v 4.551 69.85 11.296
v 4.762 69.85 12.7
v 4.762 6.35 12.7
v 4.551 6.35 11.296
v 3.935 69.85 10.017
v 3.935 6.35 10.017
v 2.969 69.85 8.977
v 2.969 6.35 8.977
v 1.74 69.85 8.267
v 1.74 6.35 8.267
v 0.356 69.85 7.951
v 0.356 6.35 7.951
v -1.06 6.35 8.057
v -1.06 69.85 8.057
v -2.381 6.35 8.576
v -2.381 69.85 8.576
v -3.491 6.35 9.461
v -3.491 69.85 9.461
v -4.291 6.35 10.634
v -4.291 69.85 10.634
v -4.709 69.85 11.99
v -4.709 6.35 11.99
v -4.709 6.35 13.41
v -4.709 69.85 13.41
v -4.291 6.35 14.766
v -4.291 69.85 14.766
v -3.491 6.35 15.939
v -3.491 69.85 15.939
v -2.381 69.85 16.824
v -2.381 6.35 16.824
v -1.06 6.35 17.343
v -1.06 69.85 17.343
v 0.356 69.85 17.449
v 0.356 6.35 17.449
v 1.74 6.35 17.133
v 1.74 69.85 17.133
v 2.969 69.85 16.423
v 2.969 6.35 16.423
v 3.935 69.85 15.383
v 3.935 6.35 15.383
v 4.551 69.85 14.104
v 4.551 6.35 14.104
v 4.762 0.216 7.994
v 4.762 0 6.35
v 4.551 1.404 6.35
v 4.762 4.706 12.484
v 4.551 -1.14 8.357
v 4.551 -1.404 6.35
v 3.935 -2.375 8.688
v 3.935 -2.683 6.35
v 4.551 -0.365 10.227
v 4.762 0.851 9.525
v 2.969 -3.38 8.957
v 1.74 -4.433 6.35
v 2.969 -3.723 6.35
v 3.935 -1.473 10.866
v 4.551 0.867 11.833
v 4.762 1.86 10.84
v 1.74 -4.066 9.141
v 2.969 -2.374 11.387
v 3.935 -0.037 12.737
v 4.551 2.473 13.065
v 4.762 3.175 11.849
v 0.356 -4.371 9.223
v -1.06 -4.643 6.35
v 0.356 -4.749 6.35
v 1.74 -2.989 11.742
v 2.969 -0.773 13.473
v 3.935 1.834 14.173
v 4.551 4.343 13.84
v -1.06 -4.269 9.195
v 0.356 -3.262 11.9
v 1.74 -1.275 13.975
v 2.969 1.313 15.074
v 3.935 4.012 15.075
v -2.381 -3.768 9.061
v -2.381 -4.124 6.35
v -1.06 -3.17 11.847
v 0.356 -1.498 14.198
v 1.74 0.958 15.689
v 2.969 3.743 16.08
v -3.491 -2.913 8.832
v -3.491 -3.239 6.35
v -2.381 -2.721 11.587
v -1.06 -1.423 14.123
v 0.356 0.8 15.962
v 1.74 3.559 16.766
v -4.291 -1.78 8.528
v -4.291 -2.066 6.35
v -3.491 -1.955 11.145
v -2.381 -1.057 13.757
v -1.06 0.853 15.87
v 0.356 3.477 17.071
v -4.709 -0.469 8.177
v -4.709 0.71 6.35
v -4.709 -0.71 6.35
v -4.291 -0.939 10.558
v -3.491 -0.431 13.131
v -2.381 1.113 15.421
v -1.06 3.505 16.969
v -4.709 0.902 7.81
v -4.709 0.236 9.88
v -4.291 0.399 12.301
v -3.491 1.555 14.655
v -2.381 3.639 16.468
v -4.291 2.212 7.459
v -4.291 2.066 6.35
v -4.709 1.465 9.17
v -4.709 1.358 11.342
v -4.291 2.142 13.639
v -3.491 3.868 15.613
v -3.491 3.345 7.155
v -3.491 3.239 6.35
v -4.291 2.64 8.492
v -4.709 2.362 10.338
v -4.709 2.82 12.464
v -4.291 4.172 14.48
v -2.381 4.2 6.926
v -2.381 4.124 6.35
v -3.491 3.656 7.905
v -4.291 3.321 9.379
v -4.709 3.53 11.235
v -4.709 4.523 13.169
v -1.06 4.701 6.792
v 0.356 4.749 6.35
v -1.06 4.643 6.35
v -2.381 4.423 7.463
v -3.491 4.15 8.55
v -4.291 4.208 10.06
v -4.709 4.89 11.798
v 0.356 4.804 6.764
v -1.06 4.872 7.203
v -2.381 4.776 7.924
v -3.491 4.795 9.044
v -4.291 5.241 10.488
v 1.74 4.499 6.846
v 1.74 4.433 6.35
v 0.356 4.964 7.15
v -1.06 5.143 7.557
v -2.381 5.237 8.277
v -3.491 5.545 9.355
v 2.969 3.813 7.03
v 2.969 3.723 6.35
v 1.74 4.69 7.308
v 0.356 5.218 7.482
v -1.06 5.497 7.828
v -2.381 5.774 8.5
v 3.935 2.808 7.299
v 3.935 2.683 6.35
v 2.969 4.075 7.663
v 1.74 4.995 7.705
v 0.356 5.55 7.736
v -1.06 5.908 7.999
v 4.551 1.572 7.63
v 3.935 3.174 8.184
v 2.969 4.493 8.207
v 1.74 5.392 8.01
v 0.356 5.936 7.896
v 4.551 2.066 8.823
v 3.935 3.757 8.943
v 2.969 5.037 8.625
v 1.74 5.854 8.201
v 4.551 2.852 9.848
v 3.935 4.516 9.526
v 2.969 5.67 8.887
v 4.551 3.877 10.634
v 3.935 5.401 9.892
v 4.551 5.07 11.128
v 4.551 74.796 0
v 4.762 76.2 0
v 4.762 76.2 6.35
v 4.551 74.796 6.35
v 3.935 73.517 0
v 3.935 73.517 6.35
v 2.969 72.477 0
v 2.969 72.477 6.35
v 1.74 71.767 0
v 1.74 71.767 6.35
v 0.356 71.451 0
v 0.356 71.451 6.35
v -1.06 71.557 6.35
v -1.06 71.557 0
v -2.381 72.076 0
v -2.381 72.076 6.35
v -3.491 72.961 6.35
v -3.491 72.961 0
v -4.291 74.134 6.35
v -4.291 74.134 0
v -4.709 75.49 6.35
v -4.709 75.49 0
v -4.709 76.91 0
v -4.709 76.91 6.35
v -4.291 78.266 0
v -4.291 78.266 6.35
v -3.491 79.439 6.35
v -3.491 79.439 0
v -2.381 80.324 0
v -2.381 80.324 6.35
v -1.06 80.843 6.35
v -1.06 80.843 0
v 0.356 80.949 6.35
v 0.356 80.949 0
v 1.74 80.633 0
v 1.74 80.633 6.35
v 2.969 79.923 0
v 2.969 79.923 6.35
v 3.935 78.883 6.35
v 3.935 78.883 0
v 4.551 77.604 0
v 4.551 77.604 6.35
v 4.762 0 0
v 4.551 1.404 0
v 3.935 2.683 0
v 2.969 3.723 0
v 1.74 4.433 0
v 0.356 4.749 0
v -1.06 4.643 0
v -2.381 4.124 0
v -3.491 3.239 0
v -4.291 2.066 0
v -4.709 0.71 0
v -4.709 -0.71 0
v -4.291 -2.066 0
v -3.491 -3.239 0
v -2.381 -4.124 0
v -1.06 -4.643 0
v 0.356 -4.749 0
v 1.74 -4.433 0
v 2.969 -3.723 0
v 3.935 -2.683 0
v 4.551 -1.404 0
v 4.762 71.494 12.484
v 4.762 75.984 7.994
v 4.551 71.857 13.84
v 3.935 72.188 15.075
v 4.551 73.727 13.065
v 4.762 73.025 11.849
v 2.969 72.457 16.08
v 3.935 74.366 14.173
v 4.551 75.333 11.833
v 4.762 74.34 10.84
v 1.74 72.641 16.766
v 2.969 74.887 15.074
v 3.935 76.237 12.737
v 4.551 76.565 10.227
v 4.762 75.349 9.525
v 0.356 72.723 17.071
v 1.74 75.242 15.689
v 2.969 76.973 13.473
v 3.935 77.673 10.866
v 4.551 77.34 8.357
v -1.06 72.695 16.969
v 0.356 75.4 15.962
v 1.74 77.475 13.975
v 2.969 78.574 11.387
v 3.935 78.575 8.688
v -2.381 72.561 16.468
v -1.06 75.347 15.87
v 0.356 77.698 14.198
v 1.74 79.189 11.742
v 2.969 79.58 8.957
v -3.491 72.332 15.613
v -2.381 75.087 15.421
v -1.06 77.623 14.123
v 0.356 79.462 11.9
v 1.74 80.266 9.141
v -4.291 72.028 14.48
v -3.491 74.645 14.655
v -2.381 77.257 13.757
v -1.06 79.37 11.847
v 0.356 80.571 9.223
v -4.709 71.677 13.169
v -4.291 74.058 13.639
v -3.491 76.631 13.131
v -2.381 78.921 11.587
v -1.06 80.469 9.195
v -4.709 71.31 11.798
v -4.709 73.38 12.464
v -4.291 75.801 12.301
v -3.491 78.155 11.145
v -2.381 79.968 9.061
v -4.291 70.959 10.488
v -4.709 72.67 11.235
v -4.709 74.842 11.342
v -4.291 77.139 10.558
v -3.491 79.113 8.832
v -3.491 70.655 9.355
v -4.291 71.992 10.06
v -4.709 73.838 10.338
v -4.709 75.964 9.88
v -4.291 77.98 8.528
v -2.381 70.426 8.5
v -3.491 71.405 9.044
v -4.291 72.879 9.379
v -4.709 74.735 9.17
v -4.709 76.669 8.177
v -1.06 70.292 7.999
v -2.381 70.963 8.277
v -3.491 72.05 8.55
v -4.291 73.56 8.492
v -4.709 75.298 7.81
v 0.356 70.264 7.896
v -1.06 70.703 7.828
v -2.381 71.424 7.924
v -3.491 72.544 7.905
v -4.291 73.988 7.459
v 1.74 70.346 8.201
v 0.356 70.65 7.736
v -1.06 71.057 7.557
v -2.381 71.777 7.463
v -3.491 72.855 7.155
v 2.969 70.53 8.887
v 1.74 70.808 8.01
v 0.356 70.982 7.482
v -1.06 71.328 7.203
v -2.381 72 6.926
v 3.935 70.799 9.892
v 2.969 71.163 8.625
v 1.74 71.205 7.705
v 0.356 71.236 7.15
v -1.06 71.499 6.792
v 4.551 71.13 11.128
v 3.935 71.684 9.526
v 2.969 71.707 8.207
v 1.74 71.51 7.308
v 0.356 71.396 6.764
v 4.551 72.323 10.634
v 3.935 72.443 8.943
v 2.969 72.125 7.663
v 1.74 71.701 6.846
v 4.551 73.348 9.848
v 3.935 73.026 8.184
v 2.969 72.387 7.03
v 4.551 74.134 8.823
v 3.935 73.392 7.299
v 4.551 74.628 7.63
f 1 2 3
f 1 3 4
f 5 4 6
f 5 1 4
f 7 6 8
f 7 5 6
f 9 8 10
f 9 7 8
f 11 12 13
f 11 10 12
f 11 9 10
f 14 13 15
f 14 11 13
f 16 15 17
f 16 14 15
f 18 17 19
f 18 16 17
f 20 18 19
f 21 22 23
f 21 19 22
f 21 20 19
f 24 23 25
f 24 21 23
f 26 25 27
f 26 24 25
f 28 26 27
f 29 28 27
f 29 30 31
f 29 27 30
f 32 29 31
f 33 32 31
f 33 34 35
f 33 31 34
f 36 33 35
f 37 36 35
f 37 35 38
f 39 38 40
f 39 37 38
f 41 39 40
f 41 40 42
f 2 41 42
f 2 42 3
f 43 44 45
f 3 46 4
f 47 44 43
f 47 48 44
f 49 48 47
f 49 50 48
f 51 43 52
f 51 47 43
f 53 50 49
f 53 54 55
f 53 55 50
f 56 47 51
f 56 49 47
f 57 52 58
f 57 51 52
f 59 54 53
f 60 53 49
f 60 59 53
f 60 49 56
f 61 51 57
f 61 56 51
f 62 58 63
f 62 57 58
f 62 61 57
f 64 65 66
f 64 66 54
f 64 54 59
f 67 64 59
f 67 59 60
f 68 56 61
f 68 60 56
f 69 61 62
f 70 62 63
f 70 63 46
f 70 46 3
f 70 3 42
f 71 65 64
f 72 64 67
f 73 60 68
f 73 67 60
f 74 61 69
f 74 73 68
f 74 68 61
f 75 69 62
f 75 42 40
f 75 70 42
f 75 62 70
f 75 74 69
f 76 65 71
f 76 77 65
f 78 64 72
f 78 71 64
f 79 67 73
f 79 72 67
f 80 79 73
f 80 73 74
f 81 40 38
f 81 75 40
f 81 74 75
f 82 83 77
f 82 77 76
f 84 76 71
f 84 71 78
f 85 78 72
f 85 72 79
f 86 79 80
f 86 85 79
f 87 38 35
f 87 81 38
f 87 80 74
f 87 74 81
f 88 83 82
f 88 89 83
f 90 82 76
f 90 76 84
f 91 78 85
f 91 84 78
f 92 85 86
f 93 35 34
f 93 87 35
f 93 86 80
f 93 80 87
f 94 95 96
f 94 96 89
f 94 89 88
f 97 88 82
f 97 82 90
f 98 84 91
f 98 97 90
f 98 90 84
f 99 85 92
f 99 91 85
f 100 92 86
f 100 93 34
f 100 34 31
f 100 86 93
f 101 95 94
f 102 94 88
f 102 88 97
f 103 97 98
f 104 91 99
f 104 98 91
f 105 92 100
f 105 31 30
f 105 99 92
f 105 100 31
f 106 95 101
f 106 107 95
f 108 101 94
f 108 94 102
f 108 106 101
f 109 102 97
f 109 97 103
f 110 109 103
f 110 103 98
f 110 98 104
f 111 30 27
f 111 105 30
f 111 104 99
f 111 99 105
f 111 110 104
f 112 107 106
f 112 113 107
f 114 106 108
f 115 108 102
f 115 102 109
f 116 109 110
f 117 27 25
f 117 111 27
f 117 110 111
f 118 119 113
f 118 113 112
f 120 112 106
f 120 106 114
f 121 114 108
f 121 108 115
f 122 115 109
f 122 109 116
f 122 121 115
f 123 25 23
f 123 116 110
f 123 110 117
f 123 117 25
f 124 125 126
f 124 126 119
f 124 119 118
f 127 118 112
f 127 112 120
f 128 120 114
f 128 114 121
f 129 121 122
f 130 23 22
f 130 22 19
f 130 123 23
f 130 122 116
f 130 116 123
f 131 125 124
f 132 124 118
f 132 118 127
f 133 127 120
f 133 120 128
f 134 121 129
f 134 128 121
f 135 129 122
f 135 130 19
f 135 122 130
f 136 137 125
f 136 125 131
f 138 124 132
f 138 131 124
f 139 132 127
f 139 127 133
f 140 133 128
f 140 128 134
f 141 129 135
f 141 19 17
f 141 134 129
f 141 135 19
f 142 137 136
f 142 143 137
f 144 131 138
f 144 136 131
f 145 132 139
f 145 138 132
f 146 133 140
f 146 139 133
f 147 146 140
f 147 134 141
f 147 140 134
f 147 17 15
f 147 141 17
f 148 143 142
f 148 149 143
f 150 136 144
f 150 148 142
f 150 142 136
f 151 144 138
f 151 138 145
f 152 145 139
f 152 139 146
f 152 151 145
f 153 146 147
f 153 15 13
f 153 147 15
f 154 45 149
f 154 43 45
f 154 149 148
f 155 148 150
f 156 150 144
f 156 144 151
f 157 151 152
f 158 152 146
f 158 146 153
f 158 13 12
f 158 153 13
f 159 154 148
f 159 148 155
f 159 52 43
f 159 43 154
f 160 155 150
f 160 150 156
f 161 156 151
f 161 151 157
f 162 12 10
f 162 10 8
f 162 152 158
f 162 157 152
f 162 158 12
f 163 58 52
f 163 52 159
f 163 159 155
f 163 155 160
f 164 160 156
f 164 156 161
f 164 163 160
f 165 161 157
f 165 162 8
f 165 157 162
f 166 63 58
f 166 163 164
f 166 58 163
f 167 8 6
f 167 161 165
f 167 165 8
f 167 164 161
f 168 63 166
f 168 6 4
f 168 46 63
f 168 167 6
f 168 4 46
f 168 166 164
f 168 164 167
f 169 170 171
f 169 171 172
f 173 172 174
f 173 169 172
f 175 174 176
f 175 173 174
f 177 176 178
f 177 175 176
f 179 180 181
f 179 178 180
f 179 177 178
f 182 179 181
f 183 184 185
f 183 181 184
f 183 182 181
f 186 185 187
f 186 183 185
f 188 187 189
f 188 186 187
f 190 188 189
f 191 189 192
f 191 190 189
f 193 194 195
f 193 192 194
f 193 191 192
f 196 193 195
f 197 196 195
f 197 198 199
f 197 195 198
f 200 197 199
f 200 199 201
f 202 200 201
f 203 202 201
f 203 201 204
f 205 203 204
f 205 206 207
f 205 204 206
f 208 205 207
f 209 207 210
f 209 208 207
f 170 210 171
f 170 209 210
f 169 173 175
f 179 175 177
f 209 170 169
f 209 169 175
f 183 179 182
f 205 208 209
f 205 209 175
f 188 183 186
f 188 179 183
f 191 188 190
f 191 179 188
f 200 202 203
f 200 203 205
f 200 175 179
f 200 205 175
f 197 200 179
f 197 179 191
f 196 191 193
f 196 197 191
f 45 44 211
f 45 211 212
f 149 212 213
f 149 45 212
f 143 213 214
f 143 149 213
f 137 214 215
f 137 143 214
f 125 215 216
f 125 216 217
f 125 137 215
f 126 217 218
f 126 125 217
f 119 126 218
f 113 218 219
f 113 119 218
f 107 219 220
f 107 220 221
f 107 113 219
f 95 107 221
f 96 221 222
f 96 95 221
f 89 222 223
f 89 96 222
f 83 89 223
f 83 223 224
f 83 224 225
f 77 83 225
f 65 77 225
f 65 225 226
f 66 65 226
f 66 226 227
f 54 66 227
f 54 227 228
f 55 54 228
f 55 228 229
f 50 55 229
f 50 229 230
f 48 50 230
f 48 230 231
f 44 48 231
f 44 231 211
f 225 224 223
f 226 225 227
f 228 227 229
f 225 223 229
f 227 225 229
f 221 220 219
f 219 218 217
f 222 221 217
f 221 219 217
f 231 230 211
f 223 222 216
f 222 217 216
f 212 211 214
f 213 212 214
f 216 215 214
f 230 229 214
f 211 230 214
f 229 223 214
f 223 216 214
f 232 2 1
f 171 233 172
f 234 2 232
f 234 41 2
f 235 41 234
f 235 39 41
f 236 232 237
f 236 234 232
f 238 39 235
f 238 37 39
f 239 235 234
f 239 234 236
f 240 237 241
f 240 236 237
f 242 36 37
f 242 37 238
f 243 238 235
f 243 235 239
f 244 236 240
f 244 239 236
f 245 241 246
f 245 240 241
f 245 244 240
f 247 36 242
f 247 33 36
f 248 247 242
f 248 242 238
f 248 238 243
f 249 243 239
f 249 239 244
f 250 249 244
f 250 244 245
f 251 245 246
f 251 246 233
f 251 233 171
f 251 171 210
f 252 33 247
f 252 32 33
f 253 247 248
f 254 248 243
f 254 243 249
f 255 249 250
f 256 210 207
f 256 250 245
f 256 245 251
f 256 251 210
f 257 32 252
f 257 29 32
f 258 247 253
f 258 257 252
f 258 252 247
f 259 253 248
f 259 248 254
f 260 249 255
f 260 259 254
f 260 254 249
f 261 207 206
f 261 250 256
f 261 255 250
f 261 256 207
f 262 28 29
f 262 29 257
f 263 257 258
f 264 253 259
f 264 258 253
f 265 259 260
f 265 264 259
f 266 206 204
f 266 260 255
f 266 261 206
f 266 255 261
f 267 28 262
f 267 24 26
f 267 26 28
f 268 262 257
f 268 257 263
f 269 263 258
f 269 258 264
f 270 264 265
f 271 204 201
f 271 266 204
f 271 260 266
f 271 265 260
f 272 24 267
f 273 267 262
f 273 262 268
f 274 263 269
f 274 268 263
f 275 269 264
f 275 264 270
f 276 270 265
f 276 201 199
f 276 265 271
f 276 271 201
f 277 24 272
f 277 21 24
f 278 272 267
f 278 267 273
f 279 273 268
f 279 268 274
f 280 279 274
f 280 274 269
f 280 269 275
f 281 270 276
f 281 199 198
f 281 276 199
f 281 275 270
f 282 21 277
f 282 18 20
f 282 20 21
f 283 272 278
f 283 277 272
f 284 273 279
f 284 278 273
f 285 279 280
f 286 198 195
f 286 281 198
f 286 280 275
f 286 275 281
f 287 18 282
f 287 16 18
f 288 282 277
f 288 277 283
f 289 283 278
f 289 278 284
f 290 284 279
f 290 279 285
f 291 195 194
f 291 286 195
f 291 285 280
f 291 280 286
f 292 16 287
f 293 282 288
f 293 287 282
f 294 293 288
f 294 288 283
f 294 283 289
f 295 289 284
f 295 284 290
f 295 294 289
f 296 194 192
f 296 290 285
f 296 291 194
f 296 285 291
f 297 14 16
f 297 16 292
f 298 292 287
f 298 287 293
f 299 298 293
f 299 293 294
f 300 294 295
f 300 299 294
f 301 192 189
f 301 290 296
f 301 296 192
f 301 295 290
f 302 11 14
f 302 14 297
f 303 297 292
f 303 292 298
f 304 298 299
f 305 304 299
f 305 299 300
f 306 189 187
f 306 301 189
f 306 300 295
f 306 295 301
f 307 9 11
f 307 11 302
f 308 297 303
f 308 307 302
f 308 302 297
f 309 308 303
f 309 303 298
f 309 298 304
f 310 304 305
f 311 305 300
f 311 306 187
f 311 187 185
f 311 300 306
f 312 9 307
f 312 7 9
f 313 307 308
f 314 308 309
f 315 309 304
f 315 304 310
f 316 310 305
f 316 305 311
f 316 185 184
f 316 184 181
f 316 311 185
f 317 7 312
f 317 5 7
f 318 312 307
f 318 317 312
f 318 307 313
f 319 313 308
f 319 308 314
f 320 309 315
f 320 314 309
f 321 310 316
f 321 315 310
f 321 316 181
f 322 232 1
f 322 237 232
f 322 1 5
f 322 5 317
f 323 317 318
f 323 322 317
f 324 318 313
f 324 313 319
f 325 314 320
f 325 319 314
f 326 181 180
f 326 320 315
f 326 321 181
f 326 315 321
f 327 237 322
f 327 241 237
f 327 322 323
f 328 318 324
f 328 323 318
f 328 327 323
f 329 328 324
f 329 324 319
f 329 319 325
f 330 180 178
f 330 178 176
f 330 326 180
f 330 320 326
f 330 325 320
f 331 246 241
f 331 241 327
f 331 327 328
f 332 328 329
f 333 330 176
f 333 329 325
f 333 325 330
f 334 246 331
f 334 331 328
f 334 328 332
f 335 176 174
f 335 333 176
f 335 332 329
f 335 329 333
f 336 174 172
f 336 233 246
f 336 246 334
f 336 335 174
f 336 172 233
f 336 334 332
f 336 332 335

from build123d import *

# Parameters (mm, degrees)
F1_R = 4.7625


with BuildPart() as f2:
    # F2: sweep along a path in F0
    with BuildLine(Plane.YZ) as f2_path:
        Line((0, 0), (0, 6.35))
        ThreePointArc((0, 6.35), (1.8598719395, 10.8401280605), (6.35, 12.7))
        Line((6.35, 12.7), (69.85, 12.7))
        ThreePointArc((69.85, 12.7), (74.3401280605, 10.8401280605), (76.2, 6.35))
        Line((76.2, 6.35), (76.2, 0))
    # F1 (on Top) → F2 (sweep)
    with BuildSketch(Plane.XY):
        Circle(F1_R)
    sweep(path=f2_path.line)


solid = f2.part
